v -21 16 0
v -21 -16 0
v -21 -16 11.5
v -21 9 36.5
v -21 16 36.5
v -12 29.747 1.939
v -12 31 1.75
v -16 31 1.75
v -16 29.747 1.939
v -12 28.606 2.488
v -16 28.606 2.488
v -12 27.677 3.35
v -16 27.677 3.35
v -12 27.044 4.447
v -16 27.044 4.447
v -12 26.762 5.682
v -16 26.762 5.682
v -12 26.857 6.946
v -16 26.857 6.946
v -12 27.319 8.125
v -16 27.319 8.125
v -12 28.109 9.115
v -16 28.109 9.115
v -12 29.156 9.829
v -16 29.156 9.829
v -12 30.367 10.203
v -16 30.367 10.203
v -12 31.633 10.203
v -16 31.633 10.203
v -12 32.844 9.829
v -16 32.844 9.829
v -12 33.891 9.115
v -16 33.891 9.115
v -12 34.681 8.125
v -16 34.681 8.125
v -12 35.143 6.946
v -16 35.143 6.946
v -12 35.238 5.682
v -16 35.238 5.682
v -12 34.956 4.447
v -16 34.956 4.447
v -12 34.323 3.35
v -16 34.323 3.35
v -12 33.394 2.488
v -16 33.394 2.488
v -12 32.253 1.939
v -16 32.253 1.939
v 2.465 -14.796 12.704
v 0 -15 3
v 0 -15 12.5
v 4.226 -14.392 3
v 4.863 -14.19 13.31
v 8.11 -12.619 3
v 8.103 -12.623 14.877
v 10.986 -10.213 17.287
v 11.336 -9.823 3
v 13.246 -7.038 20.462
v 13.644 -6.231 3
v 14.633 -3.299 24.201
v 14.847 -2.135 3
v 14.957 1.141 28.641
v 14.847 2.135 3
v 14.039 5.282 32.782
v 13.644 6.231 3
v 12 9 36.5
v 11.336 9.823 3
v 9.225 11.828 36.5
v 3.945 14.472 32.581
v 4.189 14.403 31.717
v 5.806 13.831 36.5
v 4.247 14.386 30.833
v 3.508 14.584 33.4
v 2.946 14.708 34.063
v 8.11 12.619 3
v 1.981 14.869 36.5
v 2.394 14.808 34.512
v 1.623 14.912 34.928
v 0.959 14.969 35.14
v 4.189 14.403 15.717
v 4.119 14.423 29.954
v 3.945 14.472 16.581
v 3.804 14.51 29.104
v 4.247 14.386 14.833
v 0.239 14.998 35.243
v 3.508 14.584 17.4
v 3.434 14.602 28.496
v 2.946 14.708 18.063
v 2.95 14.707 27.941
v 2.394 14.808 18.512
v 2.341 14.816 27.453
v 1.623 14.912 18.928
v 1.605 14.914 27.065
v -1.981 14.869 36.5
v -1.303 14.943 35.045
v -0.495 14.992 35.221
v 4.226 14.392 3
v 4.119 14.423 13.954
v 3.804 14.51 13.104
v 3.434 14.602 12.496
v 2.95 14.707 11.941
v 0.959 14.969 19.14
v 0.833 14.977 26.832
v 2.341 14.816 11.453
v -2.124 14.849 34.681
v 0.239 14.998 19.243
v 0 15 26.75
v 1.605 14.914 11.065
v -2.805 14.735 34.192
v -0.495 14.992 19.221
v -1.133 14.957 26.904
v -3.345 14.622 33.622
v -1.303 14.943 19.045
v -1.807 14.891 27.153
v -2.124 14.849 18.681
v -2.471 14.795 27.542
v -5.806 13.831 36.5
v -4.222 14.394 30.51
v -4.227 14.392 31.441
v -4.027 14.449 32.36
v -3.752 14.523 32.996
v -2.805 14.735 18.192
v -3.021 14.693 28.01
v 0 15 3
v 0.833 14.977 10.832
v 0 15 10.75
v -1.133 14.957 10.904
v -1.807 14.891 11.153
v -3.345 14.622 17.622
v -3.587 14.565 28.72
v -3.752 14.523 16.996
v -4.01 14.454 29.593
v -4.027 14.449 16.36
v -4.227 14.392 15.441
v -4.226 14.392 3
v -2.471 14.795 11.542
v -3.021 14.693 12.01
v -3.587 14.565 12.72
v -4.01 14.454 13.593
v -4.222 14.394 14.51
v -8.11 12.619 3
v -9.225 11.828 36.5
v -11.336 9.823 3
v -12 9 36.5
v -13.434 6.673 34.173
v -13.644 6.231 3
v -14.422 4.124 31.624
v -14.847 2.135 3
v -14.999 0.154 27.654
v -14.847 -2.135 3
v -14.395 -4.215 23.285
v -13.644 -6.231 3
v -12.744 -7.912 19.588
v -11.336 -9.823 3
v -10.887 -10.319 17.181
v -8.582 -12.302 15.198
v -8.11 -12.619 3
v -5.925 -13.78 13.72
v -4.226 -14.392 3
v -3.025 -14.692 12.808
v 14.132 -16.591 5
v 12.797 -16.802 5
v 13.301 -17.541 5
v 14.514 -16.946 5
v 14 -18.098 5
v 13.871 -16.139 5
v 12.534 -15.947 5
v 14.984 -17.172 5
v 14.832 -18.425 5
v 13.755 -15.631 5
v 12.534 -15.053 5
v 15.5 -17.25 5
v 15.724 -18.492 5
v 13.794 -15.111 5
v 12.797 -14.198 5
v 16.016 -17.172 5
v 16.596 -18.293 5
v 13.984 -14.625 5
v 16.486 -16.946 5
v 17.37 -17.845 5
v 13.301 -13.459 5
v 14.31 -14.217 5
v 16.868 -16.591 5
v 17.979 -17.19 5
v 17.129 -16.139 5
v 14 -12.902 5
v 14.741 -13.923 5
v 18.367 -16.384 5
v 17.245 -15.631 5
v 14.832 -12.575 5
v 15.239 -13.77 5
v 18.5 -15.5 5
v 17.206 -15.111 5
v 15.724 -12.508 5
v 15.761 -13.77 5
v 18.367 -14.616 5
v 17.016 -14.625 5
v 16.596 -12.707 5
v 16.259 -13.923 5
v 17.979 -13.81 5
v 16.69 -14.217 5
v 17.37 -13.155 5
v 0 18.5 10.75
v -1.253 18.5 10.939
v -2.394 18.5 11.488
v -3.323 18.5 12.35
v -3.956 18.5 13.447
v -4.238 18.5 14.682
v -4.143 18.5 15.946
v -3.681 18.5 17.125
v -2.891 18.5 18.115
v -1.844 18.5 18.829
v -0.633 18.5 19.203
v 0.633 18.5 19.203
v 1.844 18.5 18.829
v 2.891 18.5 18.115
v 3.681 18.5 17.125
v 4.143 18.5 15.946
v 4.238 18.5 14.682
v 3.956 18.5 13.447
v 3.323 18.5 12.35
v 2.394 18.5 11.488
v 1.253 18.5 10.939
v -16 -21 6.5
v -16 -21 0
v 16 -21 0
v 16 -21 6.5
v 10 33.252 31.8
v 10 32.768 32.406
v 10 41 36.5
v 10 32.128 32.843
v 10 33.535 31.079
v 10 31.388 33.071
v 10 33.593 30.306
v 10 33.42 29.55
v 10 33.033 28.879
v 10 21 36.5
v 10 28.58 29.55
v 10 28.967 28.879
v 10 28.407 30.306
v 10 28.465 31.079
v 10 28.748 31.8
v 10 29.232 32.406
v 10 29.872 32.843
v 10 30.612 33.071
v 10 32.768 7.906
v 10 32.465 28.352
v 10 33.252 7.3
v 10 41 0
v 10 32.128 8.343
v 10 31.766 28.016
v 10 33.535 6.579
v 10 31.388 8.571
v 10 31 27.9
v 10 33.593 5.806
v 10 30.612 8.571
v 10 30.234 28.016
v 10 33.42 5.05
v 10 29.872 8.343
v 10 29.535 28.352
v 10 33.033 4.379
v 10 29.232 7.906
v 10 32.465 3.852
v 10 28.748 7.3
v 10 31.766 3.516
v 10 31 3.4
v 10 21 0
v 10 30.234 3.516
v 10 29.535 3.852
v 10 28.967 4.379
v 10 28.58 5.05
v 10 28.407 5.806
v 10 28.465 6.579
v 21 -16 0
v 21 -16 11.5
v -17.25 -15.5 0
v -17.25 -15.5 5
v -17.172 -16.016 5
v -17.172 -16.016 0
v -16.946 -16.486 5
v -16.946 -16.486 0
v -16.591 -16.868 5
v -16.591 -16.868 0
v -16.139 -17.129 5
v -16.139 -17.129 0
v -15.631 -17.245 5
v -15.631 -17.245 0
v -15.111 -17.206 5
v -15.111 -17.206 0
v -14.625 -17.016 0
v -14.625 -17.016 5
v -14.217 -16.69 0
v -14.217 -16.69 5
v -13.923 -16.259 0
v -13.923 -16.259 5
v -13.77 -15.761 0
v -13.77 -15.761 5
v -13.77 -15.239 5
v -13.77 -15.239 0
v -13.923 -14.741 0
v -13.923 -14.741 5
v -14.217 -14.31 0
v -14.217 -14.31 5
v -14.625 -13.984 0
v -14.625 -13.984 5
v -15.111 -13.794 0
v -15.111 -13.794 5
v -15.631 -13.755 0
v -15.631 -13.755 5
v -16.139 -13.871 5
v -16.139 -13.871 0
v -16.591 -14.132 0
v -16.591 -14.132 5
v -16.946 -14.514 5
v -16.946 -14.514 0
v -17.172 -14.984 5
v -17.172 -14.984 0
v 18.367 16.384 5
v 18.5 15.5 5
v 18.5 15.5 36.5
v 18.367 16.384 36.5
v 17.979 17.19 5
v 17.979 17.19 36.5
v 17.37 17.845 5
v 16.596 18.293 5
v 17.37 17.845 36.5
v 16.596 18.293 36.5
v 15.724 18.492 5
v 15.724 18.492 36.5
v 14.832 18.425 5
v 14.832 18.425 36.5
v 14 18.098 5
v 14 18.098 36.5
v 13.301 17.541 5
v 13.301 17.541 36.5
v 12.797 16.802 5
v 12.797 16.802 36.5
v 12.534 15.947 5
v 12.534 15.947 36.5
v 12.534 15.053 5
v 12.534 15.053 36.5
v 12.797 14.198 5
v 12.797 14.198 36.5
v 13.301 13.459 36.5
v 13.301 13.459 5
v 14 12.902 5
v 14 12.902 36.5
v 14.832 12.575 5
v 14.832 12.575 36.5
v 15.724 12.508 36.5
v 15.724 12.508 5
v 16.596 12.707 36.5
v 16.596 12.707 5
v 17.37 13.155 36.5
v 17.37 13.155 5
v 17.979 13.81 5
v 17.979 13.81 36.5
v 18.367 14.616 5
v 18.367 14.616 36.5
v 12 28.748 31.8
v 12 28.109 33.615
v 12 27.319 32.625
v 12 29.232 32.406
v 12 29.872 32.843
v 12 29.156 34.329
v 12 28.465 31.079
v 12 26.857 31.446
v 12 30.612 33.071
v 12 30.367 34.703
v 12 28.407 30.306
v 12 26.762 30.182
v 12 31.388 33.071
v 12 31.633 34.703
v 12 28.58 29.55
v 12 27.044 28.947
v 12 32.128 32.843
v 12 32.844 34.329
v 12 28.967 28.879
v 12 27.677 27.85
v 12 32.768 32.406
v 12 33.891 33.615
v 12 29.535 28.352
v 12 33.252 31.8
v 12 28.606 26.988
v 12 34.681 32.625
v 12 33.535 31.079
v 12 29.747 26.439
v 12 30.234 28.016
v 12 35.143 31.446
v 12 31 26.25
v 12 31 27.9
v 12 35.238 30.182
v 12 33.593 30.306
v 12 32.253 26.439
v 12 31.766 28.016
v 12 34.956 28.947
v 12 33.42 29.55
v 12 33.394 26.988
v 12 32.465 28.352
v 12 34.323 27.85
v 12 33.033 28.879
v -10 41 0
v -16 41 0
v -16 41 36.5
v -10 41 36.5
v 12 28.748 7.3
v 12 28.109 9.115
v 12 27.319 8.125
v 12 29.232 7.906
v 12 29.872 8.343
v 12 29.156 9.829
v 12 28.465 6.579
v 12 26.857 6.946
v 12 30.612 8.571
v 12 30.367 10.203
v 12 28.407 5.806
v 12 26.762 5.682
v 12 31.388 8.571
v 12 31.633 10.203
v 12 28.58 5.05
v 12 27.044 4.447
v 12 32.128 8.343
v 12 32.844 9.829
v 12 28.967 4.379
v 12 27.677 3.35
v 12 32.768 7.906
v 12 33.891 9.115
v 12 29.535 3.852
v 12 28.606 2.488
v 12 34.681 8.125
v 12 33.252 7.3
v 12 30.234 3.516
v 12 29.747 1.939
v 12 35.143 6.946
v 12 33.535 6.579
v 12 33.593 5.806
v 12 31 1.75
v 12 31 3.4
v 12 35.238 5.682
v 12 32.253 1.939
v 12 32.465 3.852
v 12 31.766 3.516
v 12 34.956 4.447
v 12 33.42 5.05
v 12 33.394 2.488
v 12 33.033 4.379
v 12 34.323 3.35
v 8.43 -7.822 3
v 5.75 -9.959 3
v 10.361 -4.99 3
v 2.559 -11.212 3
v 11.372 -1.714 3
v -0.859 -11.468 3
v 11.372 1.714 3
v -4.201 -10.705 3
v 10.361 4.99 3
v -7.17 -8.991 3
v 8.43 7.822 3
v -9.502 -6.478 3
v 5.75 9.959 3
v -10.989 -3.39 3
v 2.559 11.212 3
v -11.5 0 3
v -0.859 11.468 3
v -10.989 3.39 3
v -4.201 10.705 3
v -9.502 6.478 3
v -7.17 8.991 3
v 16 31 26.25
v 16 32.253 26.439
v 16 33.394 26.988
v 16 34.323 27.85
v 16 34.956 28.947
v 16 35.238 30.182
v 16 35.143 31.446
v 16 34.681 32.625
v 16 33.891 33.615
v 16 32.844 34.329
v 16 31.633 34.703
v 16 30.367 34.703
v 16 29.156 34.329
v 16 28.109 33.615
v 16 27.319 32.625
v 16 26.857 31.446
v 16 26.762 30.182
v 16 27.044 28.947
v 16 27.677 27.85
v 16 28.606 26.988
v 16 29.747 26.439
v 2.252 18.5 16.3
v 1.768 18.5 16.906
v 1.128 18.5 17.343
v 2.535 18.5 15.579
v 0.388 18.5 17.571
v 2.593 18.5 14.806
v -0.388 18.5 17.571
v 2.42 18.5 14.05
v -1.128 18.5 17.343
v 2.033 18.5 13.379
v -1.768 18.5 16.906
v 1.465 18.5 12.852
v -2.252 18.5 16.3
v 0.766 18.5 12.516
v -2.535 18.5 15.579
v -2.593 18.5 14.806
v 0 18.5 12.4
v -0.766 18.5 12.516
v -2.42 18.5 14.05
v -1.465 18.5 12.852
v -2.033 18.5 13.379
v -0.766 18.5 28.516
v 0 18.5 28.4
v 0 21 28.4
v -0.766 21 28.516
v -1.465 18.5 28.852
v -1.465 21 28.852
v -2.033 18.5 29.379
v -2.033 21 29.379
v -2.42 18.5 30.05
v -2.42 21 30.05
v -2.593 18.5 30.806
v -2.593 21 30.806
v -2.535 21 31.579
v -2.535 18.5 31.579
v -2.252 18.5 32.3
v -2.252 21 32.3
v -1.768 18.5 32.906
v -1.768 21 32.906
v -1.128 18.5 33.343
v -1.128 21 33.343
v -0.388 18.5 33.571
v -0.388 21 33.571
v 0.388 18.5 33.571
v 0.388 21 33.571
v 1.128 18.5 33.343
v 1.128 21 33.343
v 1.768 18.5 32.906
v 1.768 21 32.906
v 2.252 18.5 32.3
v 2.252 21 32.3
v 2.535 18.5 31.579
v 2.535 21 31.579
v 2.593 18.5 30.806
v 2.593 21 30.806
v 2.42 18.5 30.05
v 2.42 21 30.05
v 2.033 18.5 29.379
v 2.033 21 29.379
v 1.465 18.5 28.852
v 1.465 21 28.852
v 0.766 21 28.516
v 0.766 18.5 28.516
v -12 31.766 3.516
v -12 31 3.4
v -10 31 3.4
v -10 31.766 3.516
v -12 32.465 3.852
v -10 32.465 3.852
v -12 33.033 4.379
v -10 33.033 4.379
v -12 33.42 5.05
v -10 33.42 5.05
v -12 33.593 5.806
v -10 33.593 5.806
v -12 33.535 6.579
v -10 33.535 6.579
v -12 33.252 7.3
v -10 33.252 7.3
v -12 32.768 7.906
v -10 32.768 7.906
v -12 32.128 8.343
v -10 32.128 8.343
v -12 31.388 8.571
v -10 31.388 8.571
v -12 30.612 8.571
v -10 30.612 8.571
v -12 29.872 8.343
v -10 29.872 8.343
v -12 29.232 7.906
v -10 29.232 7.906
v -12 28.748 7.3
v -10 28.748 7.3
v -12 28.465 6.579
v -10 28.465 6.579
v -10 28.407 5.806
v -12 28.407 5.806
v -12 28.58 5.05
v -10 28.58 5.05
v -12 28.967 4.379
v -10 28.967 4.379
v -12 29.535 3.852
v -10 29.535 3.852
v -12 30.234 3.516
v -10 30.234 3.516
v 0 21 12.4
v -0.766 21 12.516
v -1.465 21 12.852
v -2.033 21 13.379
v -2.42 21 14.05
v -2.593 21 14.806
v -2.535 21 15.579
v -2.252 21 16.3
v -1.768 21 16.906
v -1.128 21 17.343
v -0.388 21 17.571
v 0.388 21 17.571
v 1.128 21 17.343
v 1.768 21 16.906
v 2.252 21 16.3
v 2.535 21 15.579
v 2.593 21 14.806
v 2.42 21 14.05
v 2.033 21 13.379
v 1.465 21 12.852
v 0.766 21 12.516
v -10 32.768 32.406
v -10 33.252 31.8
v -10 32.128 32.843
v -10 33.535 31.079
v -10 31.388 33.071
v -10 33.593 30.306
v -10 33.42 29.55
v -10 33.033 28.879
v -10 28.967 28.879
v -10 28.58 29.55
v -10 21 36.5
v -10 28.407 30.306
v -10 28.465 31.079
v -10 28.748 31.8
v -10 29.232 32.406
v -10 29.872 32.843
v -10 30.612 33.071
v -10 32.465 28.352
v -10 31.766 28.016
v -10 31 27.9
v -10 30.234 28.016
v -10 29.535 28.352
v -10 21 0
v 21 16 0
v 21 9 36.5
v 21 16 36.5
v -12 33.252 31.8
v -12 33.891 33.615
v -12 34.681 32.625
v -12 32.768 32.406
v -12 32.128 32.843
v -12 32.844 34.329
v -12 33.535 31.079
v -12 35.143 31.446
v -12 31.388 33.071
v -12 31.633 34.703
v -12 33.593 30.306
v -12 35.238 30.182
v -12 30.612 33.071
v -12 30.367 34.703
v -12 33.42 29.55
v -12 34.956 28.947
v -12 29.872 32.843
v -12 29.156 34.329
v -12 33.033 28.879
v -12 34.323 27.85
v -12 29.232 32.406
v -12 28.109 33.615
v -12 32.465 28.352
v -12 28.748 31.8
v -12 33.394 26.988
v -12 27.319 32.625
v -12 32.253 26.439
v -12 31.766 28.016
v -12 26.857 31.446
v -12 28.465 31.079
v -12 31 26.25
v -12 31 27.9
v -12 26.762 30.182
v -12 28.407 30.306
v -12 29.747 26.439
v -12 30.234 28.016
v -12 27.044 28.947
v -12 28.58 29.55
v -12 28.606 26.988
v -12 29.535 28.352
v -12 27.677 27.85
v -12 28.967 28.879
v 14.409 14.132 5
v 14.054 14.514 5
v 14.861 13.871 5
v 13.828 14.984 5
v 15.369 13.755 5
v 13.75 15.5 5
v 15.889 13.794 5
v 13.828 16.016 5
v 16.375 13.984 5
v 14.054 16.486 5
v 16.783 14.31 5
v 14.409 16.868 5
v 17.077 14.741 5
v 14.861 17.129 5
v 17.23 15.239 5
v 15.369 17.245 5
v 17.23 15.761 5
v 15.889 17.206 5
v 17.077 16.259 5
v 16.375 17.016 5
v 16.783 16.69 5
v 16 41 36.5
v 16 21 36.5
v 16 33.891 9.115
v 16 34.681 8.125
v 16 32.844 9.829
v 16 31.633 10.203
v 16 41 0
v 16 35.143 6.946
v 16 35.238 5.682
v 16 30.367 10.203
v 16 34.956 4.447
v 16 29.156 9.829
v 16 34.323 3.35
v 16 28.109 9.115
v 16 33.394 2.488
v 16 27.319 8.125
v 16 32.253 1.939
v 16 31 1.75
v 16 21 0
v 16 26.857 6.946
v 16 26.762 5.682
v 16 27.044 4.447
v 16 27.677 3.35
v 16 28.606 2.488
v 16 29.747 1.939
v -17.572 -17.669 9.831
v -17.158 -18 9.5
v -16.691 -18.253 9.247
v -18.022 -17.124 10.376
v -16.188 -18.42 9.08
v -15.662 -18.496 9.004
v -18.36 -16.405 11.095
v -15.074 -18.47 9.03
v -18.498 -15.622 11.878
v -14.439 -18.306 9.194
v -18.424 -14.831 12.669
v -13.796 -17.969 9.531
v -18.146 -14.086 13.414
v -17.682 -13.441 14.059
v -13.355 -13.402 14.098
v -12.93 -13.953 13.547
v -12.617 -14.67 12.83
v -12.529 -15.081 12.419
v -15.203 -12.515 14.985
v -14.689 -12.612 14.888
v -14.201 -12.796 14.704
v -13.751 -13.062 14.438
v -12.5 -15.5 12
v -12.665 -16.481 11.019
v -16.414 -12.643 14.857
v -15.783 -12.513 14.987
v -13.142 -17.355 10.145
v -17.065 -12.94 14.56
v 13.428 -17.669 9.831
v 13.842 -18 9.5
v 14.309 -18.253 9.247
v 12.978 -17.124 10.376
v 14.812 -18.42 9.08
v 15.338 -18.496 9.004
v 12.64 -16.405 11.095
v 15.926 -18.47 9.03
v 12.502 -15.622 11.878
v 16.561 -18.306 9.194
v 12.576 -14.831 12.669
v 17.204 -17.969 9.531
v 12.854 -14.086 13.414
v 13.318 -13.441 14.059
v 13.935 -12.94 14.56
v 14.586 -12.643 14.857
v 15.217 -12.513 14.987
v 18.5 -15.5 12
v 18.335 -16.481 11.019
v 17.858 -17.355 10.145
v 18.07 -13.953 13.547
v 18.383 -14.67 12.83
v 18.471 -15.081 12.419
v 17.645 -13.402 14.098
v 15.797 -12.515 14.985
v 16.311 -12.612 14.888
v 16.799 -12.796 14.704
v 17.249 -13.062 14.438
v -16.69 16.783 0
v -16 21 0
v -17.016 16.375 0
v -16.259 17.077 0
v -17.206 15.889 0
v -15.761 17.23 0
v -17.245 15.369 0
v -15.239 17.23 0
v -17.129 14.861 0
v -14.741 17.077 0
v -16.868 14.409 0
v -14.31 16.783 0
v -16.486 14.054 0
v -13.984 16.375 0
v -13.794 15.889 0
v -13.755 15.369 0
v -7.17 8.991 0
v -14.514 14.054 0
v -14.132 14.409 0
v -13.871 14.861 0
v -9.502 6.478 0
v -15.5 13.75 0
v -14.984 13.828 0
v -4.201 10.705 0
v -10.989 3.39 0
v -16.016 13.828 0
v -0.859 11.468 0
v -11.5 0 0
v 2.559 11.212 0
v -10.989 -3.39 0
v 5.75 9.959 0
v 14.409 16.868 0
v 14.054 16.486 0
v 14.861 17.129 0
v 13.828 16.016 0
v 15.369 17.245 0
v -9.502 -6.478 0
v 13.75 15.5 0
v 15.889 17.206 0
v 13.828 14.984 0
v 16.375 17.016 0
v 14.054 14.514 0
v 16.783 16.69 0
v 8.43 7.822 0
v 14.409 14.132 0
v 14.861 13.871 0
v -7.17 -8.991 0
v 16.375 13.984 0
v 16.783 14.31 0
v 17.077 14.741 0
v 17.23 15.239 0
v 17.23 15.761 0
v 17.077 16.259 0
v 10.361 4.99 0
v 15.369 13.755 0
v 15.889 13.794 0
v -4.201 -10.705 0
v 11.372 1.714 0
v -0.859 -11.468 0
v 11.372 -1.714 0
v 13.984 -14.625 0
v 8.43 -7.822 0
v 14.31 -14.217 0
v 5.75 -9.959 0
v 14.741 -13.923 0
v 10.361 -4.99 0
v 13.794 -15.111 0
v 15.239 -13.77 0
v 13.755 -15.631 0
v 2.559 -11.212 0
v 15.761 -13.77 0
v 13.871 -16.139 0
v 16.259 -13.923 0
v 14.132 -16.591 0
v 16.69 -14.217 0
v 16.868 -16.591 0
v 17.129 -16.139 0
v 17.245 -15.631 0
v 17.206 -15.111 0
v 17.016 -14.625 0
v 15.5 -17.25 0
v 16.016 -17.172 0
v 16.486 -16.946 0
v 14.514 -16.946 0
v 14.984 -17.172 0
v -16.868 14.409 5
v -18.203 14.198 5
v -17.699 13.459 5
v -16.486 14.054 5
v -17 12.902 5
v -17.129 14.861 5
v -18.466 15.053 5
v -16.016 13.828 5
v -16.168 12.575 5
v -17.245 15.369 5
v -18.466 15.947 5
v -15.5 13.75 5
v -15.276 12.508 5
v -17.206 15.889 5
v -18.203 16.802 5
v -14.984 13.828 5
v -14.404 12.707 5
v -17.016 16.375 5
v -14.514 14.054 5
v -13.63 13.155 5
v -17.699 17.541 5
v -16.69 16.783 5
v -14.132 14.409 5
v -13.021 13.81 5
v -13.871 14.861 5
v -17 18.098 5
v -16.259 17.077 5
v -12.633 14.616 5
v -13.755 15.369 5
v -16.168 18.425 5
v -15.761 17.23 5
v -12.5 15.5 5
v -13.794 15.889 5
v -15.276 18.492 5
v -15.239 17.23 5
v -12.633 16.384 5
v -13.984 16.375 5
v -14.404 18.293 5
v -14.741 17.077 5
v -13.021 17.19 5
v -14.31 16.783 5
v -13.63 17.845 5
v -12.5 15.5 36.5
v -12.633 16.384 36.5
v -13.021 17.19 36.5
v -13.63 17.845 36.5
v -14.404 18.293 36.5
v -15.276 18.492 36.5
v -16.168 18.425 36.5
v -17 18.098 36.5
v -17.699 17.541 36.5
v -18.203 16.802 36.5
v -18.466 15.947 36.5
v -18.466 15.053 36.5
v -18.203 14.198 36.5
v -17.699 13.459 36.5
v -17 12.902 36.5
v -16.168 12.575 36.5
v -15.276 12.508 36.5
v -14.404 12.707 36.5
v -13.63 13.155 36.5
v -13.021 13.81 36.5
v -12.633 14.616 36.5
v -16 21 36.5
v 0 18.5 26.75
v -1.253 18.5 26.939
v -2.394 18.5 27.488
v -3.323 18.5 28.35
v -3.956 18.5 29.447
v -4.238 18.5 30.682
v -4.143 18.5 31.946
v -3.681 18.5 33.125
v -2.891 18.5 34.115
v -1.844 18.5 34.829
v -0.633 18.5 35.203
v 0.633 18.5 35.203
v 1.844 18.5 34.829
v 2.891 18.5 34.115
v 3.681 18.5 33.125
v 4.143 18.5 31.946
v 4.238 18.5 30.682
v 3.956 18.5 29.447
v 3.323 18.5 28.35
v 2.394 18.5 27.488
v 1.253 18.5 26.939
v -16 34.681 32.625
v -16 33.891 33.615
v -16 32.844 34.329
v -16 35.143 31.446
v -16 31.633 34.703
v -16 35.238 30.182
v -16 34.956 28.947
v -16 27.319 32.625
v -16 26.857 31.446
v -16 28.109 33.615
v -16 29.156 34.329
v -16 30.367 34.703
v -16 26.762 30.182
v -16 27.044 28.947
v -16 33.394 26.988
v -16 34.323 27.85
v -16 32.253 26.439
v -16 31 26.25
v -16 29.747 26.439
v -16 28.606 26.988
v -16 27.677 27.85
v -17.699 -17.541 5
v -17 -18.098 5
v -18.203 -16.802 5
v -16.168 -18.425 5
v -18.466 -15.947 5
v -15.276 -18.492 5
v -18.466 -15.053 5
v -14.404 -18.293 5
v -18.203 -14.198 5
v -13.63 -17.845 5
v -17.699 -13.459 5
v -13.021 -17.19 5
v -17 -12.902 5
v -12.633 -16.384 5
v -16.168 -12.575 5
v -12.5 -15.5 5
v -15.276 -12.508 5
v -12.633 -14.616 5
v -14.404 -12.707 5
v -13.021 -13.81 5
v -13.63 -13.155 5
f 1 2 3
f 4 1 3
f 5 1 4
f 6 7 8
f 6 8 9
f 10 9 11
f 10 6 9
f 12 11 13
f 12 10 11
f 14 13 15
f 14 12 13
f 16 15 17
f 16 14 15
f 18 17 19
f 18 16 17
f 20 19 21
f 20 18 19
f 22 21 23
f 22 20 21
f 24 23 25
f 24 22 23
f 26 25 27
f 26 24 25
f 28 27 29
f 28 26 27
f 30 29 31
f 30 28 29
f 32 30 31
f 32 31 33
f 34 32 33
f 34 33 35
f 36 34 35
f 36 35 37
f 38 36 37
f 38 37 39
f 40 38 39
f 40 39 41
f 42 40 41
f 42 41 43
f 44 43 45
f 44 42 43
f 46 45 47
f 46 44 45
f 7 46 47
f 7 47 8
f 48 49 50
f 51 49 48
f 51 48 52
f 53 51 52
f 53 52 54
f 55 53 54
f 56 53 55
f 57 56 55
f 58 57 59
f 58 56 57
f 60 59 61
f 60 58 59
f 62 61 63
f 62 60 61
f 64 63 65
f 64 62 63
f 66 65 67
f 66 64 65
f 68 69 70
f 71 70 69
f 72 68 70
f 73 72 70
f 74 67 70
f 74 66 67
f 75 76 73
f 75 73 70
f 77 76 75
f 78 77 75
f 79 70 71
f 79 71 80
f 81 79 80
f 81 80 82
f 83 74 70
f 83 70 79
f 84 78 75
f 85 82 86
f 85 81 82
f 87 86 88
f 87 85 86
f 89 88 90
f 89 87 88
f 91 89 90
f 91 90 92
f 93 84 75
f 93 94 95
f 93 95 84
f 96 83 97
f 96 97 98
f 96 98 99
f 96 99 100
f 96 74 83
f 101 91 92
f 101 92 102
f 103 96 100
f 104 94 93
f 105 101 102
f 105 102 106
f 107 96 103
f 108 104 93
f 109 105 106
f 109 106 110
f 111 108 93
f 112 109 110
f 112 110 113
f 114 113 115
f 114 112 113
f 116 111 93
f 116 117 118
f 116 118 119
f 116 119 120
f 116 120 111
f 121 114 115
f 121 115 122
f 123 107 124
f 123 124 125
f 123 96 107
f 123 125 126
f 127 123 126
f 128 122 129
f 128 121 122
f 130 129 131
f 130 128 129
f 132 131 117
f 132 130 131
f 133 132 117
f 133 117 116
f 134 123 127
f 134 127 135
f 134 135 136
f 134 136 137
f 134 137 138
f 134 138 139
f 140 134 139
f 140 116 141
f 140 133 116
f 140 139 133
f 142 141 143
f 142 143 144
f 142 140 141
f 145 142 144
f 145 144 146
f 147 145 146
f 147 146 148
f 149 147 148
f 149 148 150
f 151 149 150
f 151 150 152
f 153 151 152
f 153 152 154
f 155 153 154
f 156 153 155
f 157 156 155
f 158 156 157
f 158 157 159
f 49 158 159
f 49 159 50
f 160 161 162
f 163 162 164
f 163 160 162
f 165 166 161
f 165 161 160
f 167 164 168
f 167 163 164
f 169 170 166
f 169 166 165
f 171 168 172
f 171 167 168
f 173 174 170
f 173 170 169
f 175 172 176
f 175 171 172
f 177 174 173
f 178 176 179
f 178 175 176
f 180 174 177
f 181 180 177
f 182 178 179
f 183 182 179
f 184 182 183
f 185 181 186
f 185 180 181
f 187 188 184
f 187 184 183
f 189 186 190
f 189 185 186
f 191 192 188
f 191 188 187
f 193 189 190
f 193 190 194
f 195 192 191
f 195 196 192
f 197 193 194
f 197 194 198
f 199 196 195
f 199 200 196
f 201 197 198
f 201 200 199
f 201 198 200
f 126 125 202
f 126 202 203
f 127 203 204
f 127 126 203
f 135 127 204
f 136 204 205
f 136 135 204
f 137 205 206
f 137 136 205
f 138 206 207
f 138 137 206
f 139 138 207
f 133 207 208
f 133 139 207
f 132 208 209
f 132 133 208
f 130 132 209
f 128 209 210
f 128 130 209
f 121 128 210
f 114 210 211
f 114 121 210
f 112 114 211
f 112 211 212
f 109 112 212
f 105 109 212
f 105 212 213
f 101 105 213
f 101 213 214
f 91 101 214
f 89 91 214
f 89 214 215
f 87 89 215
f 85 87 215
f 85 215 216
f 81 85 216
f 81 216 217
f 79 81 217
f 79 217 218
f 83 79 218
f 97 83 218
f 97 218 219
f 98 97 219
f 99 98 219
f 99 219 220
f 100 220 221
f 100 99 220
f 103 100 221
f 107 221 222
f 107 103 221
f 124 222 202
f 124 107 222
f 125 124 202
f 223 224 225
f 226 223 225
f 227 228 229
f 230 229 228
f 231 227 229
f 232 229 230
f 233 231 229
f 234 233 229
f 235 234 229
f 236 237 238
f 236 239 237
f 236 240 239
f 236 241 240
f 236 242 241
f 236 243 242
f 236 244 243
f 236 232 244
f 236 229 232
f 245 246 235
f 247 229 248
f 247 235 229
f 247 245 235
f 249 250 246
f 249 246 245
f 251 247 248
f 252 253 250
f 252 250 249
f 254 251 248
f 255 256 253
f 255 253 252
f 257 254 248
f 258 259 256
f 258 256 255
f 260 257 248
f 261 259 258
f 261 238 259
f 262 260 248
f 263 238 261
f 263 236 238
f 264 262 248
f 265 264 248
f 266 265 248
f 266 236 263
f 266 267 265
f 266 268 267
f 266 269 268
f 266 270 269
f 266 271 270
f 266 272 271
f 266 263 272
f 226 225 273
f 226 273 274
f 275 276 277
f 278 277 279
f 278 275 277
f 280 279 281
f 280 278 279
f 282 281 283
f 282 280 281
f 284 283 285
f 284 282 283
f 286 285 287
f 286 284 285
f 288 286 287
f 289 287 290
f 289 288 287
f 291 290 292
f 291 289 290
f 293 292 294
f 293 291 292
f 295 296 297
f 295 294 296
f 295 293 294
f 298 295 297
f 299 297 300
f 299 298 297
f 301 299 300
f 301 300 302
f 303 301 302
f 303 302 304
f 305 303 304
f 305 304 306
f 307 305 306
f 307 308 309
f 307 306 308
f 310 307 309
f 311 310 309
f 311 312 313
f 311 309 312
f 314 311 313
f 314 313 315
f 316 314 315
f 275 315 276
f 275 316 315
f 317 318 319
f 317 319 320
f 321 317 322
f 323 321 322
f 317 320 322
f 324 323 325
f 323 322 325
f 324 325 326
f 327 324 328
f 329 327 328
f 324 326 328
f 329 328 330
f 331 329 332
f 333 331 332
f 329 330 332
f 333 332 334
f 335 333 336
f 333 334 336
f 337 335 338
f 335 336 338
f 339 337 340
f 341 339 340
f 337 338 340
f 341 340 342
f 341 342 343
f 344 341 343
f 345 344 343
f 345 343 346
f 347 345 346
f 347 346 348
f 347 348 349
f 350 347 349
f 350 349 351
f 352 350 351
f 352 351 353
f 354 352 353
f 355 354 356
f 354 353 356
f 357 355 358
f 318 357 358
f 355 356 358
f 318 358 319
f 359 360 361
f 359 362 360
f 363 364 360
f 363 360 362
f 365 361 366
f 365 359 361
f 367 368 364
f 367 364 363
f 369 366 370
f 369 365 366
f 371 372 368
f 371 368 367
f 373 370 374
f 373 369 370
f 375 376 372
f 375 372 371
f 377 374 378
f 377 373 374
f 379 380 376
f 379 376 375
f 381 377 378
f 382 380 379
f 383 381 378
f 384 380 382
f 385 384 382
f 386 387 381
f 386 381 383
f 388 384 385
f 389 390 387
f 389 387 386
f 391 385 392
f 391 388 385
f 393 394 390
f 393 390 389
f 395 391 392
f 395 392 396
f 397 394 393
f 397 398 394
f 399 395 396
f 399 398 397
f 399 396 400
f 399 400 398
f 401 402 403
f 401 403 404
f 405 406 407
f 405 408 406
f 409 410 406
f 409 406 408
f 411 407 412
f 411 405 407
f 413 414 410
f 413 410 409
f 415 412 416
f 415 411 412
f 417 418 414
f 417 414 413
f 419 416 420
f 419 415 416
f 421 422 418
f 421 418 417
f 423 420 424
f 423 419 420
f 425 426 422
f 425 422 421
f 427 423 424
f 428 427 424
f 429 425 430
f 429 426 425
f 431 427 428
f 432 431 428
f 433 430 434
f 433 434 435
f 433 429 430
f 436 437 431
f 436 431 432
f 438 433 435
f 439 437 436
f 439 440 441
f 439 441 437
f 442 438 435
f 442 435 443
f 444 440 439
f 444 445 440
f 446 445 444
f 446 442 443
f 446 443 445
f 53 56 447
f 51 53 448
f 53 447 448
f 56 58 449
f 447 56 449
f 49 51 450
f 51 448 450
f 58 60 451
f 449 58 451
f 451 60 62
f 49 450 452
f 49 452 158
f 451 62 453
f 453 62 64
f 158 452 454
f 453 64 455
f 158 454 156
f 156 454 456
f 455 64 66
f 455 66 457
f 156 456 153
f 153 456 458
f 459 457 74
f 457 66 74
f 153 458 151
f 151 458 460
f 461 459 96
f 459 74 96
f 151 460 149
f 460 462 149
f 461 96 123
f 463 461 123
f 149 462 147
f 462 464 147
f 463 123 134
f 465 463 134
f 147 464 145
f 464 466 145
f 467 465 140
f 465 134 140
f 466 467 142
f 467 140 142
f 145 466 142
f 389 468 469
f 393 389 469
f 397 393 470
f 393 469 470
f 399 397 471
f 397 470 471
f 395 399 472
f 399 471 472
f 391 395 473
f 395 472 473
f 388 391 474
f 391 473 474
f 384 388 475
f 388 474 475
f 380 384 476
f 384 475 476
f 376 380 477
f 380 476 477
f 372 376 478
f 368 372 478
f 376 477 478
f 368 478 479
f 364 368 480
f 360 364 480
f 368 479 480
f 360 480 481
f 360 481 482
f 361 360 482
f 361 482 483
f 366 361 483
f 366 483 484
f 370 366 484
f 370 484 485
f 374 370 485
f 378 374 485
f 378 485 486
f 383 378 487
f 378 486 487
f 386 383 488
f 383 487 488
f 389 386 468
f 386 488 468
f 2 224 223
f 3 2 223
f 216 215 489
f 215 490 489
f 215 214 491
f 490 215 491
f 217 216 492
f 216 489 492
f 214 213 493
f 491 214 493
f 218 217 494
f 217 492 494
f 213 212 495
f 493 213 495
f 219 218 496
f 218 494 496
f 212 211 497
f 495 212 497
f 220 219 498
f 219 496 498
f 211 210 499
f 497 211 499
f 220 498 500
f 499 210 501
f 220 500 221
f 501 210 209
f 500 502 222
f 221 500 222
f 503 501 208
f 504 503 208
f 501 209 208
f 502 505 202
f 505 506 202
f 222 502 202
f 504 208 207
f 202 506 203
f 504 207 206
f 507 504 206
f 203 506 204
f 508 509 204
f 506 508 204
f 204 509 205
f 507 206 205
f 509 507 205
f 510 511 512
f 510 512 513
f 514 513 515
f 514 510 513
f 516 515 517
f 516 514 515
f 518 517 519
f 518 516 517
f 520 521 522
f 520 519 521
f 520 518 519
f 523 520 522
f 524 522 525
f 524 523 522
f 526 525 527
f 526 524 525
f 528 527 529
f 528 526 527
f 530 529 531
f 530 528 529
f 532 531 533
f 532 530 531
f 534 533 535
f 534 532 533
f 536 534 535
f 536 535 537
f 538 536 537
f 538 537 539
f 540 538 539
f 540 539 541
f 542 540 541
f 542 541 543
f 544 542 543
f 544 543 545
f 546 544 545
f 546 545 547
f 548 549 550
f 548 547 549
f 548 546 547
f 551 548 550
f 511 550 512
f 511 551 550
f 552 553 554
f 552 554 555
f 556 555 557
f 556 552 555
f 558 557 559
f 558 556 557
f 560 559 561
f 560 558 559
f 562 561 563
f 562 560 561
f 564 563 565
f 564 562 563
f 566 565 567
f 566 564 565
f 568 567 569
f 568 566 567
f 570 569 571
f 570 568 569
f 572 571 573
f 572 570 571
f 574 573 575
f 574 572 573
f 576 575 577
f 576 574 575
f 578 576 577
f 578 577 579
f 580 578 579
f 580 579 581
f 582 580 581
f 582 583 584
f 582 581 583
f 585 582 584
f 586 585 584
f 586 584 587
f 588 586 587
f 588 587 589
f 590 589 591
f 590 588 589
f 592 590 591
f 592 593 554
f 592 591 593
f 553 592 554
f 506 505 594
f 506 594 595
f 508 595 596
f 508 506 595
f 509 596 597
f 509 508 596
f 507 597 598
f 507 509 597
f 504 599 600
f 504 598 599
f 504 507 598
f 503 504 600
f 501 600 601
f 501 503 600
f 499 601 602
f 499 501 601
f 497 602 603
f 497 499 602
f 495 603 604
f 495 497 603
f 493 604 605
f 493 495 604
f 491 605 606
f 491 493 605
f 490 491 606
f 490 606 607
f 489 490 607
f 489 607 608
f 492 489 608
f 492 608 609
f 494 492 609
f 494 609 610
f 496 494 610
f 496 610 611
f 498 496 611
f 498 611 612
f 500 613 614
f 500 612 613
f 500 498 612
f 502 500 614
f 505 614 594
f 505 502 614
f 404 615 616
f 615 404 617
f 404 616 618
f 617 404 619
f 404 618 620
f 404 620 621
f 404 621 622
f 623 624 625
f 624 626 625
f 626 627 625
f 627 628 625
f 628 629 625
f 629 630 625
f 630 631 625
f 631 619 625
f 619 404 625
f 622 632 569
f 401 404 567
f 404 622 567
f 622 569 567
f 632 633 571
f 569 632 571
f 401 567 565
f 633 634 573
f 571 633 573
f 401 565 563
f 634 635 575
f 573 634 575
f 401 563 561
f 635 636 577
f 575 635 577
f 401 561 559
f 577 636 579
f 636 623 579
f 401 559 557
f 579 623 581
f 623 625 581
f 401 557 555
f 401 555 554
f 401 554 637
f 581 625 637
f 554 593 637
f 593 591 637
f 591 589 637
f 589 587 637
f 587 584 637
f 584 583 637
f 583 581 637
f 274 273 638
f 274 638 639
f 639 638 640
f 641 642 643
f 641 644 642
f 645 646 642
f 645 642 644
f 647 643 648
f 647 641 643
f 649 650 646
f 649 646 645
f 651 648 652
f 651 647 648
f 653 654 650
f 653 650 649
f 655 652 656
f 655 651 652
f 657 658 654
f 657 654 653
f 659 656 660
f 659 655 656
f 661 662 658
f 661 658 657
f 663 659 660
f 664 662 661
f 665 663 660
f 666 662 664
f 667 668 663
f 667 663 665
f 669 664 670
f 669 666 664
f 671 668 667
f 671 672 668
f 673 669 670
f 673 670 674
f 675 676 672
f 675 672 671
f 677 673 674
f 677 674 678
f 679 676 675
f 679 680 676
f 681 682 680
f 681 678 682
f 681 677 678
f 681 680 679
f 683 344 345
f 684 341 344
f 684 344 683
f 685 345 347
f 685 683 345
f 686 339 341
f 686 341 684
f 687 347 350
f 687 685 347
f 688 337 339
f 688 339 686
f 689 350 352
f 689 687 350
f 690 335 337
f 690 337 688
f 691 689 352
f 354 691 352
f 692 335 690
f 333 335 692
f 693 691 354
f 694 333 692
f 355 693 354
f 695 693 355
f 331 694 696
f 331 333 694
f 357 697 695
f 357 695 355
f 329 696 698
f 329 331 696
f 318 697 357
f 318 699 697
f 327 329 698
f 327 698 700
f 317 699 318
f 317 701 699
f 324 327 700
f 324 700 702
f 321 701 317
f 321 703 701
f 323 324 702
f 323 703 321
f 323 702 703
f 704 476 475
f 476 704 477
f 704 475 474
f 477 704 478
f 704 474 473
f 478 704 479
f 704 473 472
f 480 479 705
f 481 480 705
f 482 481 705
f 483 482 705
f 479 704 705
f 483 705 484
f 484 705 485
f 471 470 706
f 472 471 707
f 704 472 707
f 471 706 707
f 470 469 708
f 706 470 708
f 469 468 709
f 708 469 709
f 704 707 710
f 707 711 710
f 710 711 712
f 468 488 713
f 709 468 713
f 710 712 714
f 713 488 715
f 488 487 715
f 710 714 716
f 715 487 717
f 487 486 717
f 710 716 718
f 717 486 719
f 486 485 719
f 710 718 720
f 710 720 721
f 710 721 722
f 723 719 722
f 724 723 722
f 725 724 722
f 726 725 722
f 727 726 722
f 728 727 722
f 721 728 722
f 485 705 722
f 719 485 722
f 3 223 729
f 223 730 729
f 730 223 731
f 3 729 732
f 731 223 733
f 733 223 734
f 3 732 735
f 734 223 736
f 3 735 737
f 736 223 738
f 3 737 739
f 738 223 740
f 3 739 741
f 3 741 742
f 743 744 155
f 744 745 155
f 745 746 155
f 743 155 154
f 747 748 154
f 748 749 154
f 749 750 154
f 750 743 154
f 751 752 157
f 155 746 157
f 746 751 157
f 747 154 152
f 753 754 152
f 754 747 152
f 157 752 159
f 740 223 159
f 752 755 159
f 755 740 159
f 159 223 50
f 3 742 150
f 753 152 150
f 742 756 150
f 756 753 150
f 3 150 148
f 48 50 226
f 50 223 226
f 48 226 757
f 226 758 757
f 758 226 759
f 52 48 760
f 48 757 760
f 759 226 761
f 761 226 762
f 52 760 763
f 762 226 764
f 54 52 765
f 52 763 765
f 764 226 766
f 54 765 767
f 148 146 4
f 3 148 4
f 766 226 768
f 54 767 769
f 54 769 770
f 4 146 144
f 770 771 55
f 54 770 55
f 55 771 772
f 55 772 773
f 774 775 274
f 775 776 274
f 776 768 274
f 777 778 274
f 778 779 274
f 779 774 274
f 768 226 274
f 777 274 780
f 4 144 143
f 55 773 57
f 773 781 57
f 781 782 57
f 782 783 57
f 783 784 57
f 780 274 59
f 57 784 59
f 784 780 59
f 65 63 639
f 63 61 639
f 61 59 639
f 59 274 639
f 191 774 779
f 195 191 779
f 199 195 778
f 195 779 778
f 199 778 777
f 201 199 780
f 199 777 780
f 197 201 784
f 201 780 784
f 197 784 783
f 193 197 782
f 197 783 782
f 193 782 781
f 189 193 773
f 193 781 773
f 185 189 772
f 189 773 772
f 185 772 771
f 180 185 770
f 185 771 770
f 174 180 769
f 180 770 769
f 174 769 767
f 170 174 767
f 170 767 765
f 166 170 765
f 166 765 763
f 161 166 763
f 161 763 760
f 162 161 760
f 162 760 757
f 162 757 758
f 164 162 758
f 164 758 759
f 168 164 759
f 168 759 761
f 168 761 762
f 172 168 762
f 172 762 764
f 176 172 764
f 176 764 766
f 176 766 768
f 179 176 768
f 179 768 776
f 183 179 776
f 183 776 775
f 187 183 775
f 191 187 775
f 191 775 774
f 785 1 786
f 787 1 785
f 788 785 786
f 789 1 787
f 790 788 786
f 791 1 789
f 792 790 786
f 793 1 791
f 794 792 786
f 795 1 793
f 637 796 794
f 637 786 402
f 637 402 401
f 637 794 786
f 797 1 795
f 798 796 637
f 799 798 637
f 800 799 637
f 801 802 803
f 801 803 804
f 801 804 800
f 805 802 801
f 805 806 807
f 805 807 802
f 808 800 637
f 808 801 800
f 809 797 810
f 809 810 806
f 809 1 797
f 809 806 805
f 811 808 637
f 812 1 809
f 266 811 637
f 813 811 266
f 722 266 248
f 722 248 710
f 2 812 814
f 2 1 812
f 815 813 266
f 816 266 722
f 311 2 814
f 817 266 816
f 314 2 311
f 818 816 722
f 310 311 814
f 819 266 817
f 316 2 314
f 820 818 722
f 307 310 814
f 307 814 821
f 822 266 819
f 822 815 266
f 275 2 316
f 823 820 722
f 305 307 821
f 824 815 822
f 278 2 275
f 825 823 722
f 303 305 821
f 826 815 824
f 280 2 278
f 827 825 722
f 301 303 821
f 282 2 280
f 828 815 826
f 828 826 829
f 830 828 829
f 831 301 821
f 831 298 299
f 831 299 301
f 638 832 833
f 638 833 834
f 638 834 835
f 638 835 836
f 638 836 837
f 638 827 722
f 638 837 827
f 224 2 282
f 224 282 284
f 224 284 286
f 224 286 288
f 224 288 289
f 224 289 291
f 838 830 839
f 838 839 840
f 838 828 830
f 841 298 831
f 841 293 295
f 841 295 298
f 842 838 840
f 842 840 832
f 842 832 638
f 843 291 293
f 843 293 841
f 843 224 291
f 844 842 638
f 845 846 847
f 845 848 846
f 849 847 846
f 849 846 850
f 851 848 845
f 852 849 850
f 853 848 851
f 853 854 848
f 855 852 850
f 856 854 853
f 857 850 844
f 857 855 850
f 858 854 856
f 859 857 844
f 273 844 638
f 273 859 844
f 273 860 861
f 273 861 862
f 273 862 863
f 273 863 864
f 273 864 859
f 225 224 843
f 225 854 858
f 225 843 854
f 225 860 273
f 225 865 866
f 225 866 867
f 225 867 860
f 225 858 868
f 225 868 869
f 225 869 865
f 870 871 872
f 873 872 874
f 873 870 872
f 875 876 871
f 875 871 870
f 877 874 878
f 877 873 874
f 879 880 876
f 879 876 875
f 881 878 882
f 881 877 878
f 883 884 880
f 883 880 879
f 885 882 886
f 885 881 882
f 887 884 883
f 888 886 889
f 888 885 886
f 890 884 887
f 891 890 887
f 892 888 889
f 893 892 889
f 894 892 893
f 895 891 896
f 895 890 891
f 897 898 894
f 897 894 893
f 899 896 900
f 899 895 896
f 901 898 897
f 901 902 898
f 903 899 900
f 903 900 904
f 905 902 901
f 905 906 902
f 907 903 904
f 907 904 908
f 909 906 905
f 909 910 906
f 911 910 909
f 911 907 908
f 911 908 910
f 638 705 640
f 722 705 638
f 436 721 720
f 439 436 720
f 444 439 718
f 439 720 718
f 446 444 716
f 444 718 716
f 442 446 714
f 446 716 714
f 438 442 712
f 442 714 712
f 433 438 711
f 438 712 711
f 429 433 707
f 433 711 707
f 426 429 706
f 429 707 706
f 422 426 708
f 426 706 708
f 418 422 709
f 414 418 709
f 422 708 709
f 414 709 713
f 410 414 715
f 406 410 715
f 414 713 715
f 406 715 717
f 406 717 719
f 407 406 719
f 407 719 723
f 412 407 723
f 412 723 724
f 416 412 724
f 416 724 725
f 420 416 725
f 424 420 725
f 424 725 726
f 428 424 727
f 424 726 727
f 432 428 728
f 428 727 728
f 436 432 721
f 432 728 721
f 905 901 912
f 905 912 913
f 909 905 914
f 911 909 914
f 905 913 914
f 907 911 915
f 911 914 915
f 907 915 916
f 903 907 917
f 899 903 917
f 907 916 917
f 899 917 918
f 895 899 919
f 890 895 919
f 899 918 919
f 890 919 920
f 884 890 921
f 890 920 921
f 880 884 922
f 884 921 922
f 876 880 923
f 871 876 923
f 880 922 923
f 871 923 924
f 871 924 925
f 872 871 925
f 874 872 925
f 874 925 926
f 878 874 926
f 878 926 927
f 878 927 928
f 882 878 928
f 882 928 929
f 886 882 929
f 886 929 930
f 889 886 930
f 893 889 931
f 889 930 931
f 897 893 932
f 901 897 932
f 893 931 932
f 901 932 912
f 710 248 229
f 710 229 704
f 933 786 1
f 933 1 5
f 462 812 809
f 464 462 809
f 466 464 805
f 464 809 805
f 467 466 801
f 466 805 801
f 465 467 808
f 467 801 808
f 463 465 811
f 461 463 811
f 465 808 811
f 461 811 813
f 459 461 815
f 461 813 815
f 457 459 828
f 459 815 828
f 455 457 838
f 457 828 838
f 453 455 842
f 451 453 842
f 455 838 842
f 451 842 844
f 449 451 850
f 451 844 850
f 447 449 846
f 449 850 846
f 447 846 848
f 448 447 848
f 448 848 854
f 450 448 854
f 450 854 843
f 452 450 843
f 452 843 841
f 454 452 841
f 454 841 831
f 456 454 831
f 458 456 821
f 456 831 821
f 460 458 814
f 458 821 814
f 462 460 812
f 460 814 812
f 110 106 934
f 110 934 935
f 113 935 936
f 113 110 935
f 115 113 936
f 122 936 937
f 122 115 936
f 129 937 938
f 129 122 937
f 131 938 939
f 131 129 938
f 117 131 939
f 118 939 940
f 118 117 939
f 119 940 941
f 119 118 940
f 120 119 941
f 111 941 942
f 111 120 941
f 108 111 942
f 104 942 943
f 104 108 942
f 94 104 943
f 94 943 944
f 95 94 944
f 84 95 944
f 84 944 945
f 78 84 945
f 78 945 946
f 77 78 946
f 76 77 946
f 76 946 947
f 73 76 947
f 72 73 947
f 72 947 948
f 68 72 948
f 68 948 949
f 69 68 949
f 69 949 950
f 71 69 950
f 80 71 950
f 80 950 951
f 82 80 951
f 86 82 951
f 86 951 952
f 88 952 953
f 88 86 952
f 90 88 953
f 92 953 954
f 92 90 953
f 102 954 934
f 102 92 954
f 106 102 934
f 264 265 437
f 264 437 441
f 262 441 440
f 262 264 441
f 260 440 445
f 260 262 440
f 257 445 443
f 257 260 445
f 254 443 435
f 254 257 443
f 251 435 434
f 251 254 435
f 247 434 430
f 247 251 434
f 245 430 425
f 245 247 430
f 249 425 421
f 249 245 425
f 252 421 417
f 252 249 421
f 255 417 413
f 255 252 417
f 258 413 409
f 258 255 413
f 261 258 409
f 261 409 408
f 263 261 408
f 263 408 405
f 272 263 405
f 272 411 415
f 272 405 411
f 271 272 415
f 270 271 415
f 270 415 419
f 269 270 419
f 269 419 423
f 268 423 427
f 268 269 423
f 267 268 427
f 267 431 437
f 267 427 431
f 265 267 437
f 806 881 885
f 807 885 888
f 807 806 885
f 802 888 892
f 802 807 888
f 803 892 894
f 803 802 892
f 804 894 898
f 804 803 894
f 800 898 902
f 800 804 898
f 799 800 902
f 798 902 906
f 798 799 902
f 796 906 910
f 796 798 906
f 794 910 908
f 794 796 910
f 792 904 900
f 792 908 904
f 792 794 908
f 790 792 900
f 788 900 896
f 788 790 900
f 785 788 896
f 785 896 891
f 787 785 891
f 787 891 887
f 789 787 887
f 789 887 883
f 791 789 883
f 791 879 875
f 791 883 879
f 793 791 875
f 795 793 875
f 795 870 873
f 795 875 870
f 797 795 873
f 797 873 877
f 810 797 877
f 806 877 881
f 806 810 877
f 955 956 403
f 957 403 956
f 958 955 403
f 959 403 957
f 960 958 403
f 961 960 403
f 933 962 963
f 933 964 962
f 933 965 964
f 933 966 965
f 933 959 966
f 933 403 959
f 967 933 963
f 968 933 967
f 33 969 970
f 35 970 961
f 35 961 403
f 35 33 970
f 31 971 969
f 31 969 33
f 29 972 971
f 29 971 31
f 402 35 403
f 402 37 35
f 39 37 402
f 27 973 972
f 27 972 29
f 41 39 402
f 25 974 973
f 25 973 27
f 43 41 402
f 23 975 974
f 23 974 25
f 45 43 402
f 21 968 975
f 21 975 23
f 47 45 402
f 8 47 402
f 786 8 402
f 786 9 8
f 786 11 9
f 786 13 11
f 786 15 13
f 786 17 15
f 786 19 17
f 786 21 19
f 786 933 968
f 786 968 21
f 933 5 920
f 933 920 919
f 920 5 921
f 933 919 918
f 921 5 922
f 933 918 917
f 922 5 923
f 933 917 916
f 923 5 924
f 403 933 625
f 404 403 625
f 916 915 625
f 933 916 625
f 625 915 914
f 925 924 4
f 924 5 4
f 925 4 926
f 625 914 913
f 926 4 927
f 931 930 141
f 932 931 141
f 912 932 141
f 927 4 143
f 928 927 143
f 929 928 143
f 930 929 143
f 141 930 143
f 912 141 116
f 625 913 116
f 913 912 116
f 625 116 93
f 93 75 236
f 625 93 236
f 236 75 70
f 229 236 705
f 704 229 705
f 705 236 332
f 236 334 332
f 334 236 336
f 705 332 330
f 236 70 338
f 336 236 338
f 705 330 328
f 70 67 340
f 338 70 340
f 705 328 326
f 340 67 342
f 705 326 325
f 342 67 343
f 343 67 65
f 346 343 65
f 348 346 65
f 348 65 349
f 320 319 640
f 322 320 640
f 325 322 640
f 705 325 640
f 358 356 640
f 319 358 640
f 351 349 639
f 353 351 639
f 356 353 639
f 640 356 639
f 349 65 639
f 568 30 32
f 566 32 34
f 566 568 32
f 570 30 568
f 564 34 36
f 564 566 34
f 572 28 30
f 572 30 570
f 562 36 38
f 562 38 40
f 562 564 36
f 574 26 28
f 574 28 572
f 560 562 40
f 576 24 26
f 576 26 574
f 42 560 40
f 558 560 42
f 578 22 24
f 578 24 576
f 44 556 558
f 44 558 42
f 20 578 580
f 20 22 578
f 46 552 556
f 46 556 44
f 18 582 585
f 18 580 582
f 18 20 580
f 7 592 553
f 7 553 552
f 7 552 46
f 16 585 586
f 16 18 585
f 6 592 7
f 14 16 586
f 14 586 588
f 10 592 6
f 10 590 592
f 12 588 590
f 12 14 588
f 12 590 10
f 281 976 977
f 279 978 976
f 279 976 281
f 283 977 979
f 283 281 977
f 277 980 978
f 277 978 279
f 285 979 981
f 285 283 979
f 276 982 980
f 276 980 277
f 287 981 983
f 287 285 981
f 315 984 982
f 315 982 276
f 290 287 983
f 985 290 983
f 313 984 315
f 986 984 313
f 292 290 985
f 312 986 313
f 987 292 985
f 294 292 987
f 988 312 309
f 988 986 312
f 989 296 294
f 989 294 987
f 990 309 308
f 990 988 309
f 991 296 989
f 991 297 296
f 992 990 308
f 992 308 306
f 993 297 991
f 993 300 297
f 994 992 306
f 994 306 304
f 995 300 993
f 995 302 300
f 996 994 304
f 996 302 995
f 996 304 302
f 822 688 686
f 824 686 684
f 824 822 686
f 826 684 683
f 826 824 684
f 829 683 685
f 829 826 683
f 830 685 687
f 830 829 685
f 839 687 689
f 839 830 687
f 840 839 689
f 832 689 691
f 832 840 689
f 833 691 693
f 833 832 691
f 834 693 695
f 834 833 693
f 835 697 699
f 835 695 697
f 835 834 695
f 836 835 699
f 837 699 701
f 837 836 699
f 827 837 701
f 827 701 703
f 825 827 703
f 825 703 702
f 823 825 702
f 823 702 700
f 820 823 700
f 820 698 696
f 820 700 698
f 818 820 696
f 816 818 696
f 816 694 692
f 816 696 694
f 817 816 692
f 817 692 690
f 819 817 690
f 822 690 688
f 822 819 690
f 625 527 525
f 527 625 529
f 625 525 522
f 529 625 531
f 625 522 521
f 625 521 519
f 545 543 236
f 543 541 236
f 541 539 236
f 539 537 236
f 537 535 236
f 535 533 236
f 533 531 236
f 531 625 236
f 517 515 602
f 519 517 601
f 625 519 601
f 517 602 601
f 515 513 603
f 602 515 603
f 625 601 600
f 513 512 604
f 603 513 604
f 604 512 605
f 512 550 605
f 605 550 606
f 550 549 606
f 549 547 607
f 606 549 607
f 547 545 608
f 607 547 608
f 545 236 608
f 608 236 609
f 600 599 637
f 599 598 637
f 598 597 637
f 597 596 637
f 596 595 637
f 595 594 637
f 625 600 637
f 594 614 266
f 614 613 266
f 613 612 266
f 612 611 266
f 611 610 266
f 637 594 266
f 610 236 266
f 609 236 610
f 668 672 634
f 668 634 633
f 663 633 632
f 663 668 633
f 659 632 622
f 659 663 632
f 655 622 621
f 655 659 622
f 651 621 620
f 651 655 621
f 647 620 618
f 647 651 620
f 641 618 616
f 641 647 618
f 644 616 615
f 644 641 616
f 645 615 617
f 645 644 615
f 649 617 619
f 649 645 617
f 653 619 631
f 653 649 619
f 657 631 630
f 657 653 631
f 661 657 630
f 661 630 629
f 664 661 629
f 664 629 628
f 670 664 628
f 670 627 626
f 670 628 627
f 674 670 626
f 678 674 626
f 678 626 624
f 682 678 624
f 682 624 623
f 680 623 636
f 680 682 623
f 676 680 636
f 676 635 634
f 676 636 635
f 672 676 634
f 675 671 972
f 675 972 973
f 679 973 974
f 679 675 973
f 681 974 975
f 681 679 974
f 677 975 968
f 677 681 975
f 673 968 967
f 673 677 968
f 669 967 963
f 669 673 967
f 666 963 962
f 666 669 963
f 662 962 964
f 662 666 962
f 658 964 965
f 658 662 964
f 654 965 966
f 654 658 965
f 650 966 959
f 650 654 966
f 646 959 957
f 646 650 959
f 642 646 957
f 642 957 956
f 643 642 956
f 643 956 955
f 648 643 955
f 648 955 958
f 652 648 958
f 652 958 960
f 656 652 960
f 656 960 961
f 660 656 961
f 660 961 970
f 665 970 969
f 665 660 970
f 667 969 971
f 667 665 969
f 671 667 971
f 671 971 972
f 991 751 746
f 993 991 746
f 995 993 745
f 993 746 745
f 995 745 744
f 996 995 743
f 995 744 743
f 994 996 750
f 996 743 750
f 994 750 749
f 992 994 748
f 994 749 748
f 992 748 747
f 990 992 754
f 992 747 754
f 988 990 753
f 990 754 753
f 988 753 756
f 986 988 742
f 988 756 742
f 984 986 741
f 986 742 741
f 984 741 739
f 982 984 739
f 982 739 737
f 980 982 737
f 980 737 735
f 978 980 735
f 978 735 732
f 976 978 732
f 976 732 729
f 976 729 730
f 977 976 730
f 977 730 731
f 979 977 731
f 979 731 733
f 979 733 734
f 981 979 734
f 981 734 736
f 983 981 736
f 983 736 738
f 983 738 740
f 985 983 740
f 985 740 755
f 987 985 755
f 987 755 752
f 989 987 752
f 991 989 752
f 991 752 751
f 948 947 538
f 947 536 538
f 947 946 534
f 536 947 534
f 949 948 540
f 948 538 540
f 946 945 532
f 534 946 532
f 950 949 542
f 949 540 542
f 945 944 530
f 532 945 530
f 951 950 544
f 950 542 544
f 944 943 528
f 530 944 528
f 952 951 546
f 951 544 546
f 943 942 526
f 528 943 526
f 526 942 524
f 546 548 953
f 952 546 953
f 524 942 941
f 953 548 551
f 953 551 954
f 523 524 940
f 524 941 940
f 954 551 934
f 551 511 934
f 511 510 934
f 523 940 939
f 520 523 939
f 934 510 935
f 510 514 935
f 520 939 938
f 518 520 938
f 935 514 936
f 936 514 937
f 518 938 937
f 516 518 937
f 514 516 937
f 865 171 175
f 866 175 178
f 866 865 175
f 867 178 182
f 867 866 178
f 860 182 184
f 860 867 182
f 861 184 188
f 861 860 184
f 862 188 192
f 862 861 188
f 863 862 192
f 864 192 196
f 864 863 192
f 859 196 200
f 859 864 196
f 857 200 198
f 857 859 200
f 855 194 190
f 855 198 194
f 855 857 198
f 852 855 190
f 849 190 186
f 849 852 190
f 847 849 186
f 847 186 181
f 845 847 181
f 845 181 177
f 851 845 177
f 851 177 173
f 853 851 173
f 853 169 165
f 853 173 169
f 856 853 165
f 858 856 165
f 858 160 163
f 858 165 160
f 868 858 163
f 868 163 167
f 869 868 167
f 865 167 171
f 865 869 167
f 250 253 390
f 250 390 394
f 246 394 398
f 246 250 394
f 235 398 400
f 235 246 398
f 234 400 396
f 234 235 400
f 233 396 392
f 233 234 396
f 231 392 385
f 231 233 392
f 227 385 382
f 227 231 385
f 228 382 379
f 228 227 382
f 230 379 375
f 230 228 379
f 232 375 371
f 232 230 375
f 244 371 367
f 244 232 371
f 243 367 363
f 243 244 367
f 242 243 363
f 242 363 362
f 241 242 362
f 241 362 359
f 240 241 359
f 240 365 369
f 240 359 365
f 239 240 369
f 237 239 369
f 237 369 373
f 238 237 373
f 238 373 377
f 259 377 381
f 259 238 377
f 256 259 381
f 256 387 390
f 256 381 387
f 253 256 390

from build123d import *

# Parameters (mm, degrees)
SKETCH_1_W               = 42
SKETCH_1_H               = 42
EXTRUDE_1_DEPTH          = 6.5
EXTRUDE_2_DEPTH          = 42
SKETCH_2_R               = 15
CUT_EXTRUDE_2_DEPTH      = 57.870466852
SKETCH_4_R               = 1.75
CUT_EXTRUDE_1_DEPTH      = 57.870466852
CHAMFER_1_SIZE           = 5
CUT_EXTRUDE_3_DEPTH      = 68.507407001
SKETCH_7_R               = 3
CUT_EXTRUDE_4_DEPTH      = 31.5
CUT_EXTRUDE_5_DEPTH      = 48.055817919
CUT_EXTRUDE_5_DEPTH_BACK = 5
SKETCH_8_R               = 2.6
SKETCH_9_R               = 4.25
CUT_EXTRUDE_6_DEPTH      = 18.5
SKETCH_10_R              = 15
SKETCH_10_R_2            = 11.5
EXTRUDE_3_DEPTH          = 3
SKETCH_11_W              = 6
SKETCH_11_H              = 36.5
EXTRUDE_4_DEPTH          = 20
CUT_EXTRUDE_7_DEPTH      = 67.198564994
CUT_EXTRUDE_7_DEPTH_BACK = 67.198564994
SKETCH_12_R              = 2.6
SKETCH_13_R              = 4.25
CUT_EXTRUDE_8_DEPTH      = 4
CUT_EXTRUDE_START        = -4
SKETCH_14_R              = 4.25
CUT_EXTRUDE_9_DEPTH      = 4


with BuildPart() as part:
    # 草圖1 → 填料-伸長1 (new body)
    with BuildSketch(Plane.XY):
        Rectangle(SKETCH_1_W, SKETCH_1_H)
    extrude(amount=EXTRUDE_1_DEPTH)

    # 草圖5 → 填料-伸長2 (add)
    with BuildSketch(Plane(origin=(21, 0, 0), x_dir=(0, 0, -1), z_dir=(1, 0, 0))):
        Polygon((-6.5, -21), (-48.5, 21), (-6.5, 21), align=None)
    extrude(amount=-EXTRUDE_2_DEPTH)

    # 草圖2 → 除料-伸長2 (cut, through all)
    with BuildSketch(Plane.XY):
        with Locations(Location((0, 0, 0), (0, 0, 270))):
            Circle(SKETCH_2_R)
    extrude(amount=CUT_EXTRUDE_2_DEPTH, mode=Mode.SUBTRACT)

    # 草圖4 → 除料-伸長1 (cut, through all)
    with BuildSketch(Plane.XY):
        with Locations(Location((-15.5, 15.5, 0), (0, 0, 270))):
            Circle(SKETCH_4_R)
        with Locations(Location((-15.5, -15.5, 0), (0, 0, 180))):
            Circle(SKETCH_4_R)
        with Locations(Location((15.5, -15.5, 0), (0, 0, 270))):
            Circle(SKETCH_4_R)
        with Locations(Location((15.5, 15.5, 0), (0, 0, 180))):
            Circle(SKETCH_4_R)
    extrude(amount=CUT_EXTRUDE_1_DEPTH, mode=Mode.SUBTRACT)

    # 導角1
    chamfer_1_edges = [part.edges().sort_by_distance(p)[0] for p in [
        (-21, 21, 24.25),
        (21, 21, 24.25),
        (21, -21, 3.25),
        (-21, -21, 3.25),
    ]]
    chamfer(chamfer_1_edges, length=CHAMFER_1_SIZE)

    # 草圖6 → 除料-伸長3 (cut, through all)
    with BuildSketch(Plane.ZY.offset(21)):
        Polygon((48.5, 21), (36.5, 21), (36.5, 9), align=None)
    extrude(amount=-CUT_EXTRUDE_3_DEPTH, mode=Mode.SUBTRACT)

    # 草圖7 → 除料-伸長4 (cut)
    with BuildSketch(Plane.XY.offset(36.5)):
        with Locations((-15.5, 15.5)):
            Circle(SKETCH_7_R)
        with Locations((15.5, 15.5)):
            Circle(SKETCH_7_R)
        with Locations((15.5, -15.5)):
            Circle(SKETCH_7_R)
        with Locations((-15.5, -15.5)):
            Circle(SKETCH_7_R)
    extrude(amount=-CUT_EXTRUDE_4_DEPTH, mode=Mode.SUBTRACT)

    # 草圖8 → 除料-伸長5 (cut, two sides: drawn at the far end of the back side and taken through both)
    with BuildSketch(Plane(origin=(0, 0, 0), x_dir=(1, 0, 0), z_dir=(0, 1, 0)).offset(-CUT_EXTRUDE_5_DEPTH_BACK)):
        with Locations(Location((0, -15, 0), (0, 0, 90))):
            Circle(SKETCH_8_R)
        with Locations(Location((0, -31, 0), (0, 0, 90))):
            Circle(SKETCH_8_R)
    extrude(amount=CUT_EXTRUDE_5_DEPTH + CUT_EXTRUDE_5_DEPTH_BACK, mode=Mode.SUBTRACT)

    # 草圖9 → 除料-伸長6 (cut)
    with BuildSketch(Plane(origin=(0, 0, 0), x_dir=(1, 0, 0), z_dir=(0, 1, 0))):
        with Locations(Location((0, -31, 0), (0, 0, 90))):
            Circle(SKETCH_9_R)
        with Locations(Location((0, -15, 0), (0, 0, 90))):
            Circle(SKETCH_9_R)
    extrude(amount=CUT_EXTRUDE_6_DEPTH, mode=Mode.SUBTRACT)

    # 草圖10 → 填料-伸長3 (add)
    with BuildSketch(Plane(origin=(0, 0, 0), x_dir=(-1, 0, 0), z_dir=(0, 0, -1))):
        Circle(SKETCH_10_R)
        Circle(SKETCH_10_R_2, mode=Mode.SUBTRACT)
    extrude(amount=-EXTRUDE_3_DEPTH)

    # 草圖11 → 填料-伸長4 (add)
    with BuildSketch(Plane(origin=(0, 21, 0), x_dir=(1, 0, 0), z_dir=(0, 1, 0))):
        with Locations((13, -18.25)):
            Rectangle(SKETCH_11_W, SKETCH_11_H)
        with Locations((-13, -18.25)):
            Rectangle(SKETCH_11_W, SKETCH_11_H)
    extrude(amount=EXTRUDE_4_DEPTH)

    # 草圖12 → 除料-伸長7 (cut, two sides: drawn at the far end of the back side and taken through both)
    with BuildSketch(Plane(origin=(16, 0, 0), x_dir=(0, 0, -1), z_dir=(1, 0, 0)).offset(-CUT_EXTRUDE_7_DEPTH_BACK)):
        with Locations((-30.5, 31)):
            Circle(SKETCH_12_R)
        with Locations((-6, 31)):
            Circle(SKETCH_12_R)
    extrude(amount=CUT_EXTRUDE_7_DEPTH + CUT_EXTRUDE_7_DEPTH_BACK, mode=Mode.SUBTRACT)

    # 草圖13 → 除料-伸長8 (cut)
    with BuildSketch(Plane(origin=(16, 0, 0), x_dir=(0, 0, -1), z_dir=(1, 0, 0))):
        with Locations((-30.5, 31)):
            Circle(SKETCH_13_R)
        with Locations((-6, 31)):
            Circle(SKETCH_13_R)
    extrude(amount=-CUT_EXTRUDE_8_DEPTH, mode=Mode.SUBTRACT)

    # 草圖14 → 除料-伸長9 (cut)
    with BuildSketch(Plane.ZY.offset(16).offset(CUT_EXTRUDE_START)):
        with Locations(Location((30.5, 31, 0), (0, 0, 180))):
            Circle(SKETCH_14_R)
        with Locations(Location((6, 31, 0), (0, 0, 180))):
            Circle(SKETCH_14_R)
    extrude(amount=CUT_EXTRUDE_9_DEPTH, mode=Mode.SUBTRACT)


solid = part.part
